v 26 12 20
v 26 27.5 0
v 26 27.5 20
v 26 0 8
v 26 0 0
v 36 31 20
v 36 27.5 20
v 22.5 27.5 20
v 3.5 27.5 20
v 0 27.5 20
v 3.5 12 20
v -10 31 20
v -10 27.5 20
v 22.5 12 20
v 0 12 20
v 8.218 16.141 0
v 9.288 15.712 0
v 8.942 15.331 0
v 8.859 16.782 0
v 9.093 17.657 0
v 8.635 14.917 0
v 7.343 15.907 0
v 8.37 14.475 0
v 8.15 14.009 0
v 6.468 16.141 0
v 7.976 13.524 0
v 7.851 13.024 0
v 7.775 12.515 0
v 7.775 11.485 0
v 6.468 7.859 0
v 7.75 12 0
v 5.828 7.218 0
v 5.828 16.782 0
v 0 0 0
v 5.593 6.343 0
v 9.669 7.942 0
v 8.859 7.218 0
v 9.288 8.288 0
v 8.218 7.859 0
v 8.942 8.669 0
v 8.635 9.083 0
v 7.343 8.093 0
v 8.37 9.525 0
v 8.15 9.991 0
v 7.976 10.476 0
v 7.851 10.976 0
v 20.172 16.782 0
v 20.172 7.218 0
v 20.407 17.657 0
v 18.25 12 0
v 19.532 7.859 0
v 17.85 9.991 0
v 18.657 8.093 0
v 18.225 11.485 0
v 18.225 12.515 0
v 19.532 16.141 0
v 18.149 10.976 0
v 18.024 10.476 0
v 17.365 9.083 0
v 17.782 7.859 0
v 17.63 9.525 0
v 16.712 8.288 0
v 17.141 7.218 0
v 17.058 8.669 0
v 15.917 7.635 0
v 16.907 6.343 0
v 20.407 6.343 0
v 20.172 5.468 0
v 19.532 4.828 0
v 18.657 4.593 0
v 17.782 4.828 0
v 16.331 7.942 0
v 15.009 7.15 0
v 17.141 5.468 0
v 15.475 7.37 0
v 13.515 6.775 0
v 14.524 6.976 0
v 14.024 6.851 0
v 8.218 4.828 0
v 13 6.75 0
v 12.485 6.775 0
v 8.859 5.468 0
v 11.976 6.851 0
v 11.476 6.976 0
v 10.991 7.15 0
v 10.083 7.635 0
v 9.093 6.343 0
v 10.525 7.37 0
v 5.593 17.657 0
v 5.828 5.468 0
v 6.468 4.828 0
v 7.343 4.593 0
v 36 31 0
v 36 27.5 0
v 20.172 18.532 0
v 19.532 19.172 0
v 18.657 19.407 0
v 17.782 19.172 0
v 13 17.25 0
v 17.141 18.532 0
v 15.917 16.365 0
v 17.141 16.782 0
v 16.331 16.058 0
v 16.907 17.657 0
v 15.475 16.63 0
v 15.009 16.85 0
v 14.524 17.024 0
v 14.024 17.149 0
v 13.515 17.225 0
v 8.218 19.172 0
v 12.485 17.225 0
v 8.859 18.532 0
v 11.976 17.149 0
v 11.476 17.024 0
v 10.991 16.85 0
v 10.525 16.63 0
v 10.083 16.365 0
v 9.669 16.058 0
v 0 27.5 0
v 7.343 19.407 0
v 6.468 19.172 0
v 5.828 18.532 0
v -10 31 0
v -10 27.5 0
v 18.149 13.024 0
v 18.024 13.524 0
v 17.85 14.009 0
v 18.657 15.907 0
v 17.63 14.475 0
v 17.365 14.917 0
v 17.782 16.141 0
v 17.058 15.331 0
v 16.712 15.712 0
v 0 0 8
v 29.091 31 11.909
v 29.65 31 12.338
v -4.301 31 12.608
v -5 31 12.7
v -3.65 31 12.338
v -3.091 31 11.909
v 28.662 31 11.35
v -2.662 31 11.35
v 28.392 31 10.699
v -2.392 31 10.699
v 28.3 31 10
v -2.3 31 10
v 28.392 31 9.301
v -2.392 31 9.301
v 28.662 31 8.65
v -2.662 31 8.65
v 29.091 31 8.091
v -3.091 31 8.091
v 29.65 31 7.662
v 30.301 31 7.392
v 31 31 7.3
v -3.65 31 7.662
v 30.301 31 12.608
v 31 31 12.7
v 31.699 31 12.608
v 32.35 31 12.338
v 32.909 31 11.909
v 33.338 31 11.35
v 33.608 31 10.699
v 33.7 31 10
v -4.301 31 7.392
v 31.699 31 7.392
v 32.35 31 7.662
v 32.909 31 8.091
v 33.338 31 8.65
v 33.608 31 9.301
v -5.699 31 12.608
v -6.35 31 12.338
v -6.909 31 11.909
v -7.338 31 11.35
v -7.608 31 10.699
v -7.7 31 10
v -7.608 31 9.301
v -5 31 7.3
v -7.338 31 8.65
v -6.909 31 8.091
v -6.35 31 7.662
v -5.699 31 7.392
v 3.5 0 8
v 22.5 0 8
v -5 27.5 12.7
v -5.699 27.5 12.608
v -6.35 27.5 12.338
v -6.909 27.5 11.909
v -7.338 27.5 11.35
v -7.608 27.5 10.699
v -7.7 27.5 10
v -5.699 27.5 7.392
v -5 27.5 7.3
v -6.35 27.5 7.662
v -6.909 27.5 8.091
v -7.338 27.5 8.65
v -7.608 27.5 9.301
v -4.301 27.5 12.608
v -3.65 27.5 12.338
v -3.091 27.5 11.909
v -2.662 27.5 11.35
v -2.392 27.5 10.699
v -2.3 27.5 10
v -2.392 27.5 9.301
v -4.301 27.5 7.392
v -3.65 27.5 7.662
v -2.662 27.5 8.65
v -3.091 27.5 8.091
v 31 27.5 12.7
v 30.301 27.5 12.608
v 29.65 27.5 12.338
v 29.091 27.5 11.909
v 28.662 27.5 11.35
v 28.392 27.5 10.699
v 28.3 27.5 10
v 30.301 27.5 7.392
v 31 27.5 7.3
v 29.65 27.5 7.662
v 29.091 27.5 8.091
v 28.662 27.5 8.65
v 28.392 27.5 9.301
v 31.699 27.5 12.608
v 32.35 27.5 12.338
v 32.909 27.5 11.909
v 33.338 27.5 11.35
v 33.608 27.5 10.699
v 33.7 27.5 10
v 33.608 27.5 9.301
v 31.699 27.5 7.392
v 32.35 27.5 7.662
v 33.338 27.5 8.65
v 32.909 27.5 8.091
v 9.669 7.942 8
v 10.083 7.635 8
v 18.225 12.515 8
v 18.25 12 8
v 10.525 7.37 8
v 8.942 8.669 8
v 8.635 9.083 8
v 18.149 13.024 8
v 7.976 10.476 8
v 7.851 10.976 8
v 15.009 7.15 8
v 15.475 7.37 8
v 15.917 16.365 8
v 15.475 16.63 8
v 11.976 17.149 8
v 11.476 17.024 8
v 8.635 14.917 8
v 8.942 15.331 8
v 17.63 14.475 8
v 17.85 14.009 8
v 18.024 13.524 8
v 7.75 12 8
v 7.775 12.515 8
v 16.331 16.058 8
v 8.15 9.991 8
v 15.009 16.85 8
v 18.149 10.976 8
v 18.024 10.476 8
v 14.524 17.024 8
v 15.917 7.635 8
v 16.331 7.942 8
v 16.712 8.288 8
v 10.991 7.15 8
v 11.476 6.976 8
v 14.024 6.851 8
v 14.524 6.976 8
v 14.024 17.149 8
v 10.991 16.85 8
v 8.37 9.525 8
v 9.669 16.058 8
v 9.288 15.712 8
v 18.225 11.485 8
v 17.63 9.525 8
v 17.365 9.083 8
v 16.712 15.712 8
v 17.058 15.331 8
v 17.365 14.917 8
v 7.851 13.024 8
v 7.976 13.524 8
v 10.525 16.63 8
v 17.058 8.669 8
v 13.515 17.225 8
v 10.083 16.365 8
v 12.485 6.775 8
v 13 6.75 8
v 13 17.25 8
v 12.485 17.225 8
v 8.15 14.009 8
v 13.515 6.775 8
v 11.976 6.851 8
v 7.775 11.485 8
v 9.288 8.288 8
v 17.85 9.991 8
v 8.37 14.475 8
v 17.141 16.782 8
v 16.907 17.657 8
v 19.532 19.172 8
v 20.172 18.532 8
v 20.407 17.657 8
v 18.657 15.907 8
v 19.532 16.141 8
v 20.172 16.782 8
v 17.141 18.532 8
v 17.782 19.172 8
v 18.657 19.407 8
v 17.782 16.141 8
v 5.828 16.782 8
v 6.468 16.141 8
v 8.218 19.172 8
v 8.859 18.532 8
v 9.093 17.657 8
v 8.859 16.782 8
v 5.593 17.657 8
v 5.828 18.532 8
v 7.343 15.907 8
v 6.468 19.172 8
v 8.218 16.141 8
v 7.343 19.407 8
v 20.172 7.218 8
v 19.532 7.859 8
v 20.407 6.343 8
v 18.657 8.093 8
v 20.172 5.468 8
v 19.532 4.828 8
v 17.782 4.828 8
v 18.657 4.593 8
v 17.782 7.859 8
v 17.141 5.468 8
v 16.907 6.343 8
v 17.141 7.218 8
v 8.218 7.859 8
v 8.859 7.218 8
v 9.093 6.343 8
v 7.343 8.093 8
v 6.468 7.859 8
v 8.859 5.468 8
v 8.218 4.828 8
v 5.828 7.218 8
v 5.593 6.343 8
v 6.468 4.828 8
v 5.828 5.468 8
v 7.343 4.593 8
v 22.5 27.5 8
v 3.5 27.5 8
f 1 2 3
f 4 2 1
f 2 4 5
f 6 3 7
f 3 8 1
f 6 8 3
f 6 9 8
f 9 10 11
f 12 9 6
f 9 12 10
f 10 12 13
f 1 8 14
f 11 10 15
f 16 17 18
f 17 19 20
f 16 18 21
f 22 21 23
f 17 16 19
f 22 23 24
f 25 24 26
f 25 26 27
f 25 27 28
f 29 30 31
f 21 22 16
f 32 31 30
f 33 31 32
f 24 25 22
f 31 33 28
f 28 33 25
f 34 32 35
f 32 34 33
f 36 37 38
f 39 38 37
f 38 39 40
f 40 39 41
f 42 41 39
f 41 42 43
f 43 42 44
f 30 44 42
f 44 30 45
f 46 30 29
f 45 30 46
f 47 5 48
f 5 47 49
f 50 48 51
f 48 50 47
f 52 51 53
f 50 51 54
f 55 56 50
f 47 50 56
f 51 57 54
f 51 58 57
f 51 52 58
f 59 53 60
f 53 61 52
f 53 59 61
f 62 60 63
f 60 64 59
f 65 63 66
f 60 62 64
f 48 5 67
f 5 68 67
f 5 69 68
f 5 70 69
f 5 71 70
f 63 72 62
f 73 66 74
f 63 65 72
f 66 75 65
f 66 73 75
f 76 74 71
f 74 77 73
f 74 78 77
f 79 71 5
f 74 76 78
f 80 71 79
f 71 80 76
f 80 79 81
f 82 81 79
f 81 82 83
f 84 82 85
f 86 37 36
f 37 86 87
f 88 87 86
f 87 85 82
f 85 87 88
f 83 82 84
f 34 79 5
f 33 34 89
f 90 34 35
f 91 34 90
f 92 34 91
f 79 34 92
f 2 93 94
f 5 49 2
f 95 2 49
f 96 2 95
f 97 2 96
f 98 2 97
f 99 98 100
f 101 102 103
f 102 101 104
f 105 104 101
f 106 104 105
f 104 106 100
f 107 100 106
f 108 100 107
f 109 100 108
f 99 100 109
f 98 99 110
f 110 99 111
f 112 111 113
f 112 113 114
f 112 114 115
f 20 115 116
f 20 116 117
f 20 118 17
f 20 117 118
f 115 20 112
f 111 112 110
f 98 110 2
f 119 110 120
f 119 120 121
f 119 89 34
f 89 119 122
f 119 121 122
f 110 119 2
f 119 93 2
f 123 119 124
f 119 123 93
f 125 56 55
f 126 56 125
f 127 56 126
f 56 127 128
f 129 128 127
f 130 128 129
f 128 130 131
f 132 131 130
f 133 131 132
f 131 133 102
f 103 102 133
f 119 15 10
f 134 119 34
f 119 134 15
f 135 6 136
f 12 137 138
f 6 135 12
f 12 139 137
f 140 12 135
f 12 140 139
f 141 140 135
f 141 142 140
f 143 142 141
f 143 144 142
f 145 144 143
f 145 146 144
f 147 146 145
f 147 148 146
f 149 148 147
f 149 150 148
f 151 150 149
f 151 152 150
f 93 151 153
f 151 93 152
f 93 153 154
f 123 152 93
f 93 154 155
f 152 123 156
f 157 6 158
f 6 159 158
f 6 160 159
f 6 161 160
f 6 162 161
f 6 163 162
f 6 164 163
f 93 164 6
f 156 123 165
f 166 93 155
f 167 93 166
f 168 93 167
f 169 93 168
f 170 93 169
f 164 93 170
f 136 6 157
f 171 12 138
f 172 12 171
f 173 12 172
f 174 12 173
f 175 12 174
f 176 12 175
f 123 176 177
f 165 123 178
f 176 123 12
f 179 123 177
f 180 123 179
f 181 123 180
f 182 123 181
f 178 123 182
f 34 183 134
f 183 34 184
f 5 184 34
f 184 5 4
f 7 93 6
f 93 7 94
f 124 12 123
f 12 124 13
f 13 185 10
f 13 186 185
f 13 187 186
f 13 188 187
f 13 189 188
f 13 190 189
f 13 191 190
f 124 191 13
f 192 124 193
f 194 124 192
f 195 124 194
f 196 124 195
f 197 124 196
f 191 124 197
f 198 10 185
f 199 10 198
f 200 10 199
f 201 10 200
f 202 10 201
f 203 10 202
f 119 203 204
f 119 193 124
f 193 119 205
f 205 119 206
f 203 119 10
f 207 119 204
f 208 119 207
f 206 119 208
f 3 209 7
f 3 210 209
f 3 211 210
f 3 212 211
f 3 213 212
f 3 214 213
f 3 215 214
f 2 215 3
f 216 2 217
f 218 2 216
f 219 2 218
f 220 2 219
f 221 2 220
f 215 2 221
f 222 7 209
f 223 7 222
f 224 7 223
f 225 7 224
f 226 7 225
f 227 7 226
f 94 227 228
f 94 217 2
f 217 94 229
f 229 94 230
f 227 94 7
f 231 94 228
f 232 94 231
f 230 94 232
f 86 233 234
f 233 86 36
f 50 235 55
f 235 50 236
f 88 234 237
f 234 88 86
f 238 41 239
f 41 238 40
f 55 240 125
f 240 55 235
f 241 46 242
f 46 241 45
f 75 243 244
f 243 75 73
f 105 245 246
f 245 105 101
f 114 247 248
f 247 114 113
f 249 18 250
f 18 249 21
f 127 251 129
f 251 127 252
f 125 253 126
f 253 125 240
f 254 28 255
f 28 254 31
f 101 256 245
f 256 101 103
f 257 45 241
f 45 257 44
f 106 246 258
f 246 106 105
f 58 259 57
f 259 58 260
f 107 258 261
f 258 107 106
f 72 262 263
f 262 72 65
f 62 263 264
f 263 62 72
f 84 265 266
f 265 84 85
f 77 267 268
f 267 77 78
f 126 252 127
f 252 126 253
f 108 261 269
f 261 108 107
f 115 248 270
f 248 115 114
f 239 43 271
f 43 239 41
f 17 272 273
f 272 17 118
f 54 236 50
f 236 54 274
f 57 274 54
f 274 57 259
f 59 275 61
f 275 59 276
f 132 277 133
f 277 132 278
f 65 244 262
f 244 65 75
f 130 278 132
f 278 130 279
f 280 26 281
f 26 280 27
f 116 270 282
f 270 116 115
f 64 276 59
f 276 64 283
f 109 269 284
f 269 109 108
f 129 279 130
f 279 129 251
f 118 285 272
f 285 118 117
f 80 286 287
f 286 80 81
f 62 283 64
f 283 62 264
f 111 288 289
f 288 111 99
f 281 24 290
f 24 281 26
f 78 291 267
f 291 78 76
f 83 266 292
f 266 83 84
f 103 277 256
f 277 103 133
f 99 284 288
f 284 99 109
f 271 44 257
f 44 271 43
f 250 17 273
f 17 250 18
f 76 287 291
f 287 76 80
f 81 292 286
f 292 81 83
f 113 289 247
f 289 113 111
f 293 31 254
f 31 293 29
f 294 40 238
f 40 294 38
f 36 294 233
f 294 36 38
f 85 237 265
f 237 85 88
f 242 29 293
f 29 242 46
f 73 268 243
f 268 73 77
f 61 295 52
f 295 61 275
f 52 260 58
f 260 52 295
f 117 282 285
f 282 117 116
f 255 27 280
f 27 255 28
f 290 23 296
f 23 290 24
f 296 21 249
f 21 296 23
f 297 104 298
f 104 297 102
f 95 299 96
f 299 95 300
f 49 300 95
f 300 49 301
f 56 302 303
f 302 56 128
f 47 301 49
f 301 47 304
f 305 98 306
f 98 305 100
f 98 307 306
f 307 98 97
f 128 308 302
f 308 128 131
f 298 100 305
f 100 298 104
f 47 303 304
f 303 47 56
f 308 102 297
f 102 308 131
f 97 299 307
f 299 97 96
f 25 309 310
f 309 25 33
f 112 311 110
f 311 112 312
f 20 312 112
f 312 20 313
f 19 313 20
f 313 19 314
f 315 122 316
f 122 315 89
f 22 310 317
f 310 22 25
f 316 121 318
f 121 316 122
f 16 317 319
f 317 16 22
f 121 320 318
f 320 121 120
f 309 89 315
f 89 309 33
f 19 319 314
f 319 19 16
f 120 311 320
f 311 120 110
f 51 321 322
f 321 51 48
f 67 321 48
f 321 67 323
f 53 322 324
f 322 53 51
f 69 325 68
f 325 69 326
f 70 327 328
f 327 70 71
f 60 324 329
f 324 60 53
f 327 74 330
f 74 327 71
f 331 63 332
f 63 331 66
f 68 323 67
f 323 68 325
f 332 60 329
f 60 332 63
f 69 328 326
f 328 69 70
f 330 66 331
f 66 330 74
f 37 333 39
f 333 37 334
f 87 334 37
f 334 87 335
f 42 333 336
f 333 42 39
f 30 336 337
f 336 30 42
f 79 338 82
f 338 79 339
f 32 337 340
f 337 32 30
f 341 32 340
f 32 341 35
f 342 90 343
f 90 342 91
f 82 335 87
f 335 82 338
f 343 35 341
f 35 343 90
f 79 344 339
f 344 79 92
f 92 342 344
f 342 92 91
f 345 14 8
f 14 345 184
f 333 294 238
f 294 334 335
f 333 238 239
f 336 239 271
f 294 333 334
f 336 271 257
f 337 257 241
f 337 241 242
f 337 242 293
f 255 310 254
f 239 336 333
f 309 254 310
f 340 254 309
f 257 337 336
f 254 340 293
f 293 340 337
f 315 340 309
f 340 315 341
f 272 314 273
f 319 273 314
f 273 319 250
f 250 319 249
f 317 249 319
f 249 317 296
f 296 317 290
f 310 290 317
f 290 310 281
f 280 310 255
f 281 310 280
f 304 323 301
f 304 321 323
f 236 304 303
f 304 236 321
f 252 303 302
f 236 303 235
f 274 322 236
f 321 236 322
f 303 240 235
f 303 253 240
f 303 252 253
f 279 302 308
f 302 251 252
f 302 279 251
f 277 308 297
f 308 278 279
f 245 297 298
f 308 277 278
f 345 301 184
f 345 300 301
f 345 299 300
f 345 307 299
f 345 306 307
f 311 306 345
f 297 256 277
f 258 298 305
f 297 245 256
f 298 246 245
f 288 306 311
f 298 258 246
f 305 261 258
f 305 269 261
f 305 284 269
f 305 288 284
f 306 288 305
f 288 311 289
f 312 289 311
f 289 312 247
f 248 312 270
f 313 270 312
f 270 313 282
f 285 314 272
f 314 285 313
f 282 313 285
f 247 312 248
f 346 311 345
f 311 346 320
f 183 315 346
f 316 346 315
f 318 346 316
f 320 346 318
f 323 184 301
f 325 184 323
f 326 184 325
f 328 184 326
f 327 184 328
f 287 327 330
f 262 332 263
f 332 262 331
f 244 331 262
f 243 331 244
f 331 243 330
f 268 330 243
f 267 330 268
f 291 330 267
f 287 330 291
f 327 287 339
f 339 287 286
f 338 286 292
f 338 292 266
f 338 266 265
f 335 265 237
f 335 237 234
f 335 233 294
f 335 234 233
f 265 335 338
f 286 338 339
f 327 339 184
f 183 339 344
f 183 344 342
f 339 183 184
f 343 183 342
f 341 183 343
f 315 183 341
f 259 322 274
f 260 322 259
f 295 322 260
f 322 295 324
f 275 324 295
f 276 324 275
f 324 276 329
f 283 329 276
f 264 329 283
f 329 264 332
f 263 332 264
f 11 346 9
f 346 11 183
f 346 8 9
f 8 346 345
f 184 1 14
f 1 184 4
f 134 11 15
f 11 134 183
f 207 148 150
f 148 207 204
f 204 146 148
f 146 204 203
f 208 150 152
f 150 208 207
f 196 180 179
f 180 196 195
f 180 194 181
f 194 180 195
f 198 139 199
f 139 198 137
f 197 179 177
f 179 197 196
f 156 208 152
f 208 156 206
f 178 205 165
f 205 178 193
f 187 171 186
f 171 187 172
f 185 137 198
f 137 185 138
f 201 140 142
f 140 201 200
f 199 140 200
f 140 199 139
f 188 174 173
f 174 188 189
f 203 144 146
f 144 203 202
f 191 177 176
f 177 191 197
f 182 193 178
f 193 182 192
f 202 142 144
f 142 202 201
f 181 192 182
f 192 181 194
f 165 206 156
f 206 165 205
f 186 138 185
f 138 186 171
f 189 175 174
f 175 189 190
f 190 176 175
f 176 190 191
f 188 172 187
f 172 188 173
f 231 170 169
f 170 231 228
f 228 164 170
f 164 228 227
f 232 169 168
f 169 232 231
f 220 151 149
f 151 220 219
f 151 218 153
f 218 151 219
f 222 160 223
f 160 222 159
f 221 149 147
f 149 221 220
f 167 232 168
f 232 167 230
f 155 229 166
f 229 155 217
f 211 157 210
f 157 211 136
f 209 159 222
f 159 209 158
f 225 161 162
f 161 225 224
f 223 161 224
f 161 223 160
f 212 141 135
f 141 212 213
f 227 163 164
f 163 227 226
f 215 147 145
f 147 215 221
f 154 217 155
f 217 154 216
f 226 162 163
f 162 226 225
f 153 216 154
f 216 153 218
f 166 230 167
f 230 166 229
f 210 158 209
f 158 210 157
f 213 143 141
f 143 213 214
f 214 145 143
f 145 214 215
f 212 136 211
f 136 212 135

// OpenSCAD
cent=12;
length=26;
t=3.5;

difference()
{
    union()
    {
        cube([length,cent+19,20]);
        translate([-10,cent+19-t,0])
            cube([10+length+10,t,20]);
    }
        
    union()
    {
        translate([length/2,cent,0])
            cylinder(d=10.5,h=30,$fn=64);
        
        translate([length/2+8/sqrt(2),cent+8/sqrt(2),0])
            cylinder(d=3.5,h=30,$fn=12);
        translate([length/2-8/sqrt(2),cent+8/sqrt(2),0])
            cylinder(d=3.5,h=30,$fn=12);
        translate([length/2+8/sqrt(2),cent-8/sqrt(2),0])
            cylinder(d=3.5,h=30,$fn=12);
        translate([length/2-8/sqrt(2),cent-8/sqrt(2),0])
            cylinder(d=3.5,h=30,$fn=12);
        
        
        translate([t,0,8])
            cube([length-t*2,cent+19-t,20]);
        
        translate([0,0,8])
            rotate([45,0,0])
                cube([30,40,40]);
        
        translate([-5,cent+19-t,10])
            rotate([270,0,0])
                cylinder(d=5.4,h=t+1,$fn=24);
        translate([length+5,cent+19-t,10])
            rotate([270,0,0])
                cylinder(d=5.4,h=t+1,$fn=24);
    }
}
